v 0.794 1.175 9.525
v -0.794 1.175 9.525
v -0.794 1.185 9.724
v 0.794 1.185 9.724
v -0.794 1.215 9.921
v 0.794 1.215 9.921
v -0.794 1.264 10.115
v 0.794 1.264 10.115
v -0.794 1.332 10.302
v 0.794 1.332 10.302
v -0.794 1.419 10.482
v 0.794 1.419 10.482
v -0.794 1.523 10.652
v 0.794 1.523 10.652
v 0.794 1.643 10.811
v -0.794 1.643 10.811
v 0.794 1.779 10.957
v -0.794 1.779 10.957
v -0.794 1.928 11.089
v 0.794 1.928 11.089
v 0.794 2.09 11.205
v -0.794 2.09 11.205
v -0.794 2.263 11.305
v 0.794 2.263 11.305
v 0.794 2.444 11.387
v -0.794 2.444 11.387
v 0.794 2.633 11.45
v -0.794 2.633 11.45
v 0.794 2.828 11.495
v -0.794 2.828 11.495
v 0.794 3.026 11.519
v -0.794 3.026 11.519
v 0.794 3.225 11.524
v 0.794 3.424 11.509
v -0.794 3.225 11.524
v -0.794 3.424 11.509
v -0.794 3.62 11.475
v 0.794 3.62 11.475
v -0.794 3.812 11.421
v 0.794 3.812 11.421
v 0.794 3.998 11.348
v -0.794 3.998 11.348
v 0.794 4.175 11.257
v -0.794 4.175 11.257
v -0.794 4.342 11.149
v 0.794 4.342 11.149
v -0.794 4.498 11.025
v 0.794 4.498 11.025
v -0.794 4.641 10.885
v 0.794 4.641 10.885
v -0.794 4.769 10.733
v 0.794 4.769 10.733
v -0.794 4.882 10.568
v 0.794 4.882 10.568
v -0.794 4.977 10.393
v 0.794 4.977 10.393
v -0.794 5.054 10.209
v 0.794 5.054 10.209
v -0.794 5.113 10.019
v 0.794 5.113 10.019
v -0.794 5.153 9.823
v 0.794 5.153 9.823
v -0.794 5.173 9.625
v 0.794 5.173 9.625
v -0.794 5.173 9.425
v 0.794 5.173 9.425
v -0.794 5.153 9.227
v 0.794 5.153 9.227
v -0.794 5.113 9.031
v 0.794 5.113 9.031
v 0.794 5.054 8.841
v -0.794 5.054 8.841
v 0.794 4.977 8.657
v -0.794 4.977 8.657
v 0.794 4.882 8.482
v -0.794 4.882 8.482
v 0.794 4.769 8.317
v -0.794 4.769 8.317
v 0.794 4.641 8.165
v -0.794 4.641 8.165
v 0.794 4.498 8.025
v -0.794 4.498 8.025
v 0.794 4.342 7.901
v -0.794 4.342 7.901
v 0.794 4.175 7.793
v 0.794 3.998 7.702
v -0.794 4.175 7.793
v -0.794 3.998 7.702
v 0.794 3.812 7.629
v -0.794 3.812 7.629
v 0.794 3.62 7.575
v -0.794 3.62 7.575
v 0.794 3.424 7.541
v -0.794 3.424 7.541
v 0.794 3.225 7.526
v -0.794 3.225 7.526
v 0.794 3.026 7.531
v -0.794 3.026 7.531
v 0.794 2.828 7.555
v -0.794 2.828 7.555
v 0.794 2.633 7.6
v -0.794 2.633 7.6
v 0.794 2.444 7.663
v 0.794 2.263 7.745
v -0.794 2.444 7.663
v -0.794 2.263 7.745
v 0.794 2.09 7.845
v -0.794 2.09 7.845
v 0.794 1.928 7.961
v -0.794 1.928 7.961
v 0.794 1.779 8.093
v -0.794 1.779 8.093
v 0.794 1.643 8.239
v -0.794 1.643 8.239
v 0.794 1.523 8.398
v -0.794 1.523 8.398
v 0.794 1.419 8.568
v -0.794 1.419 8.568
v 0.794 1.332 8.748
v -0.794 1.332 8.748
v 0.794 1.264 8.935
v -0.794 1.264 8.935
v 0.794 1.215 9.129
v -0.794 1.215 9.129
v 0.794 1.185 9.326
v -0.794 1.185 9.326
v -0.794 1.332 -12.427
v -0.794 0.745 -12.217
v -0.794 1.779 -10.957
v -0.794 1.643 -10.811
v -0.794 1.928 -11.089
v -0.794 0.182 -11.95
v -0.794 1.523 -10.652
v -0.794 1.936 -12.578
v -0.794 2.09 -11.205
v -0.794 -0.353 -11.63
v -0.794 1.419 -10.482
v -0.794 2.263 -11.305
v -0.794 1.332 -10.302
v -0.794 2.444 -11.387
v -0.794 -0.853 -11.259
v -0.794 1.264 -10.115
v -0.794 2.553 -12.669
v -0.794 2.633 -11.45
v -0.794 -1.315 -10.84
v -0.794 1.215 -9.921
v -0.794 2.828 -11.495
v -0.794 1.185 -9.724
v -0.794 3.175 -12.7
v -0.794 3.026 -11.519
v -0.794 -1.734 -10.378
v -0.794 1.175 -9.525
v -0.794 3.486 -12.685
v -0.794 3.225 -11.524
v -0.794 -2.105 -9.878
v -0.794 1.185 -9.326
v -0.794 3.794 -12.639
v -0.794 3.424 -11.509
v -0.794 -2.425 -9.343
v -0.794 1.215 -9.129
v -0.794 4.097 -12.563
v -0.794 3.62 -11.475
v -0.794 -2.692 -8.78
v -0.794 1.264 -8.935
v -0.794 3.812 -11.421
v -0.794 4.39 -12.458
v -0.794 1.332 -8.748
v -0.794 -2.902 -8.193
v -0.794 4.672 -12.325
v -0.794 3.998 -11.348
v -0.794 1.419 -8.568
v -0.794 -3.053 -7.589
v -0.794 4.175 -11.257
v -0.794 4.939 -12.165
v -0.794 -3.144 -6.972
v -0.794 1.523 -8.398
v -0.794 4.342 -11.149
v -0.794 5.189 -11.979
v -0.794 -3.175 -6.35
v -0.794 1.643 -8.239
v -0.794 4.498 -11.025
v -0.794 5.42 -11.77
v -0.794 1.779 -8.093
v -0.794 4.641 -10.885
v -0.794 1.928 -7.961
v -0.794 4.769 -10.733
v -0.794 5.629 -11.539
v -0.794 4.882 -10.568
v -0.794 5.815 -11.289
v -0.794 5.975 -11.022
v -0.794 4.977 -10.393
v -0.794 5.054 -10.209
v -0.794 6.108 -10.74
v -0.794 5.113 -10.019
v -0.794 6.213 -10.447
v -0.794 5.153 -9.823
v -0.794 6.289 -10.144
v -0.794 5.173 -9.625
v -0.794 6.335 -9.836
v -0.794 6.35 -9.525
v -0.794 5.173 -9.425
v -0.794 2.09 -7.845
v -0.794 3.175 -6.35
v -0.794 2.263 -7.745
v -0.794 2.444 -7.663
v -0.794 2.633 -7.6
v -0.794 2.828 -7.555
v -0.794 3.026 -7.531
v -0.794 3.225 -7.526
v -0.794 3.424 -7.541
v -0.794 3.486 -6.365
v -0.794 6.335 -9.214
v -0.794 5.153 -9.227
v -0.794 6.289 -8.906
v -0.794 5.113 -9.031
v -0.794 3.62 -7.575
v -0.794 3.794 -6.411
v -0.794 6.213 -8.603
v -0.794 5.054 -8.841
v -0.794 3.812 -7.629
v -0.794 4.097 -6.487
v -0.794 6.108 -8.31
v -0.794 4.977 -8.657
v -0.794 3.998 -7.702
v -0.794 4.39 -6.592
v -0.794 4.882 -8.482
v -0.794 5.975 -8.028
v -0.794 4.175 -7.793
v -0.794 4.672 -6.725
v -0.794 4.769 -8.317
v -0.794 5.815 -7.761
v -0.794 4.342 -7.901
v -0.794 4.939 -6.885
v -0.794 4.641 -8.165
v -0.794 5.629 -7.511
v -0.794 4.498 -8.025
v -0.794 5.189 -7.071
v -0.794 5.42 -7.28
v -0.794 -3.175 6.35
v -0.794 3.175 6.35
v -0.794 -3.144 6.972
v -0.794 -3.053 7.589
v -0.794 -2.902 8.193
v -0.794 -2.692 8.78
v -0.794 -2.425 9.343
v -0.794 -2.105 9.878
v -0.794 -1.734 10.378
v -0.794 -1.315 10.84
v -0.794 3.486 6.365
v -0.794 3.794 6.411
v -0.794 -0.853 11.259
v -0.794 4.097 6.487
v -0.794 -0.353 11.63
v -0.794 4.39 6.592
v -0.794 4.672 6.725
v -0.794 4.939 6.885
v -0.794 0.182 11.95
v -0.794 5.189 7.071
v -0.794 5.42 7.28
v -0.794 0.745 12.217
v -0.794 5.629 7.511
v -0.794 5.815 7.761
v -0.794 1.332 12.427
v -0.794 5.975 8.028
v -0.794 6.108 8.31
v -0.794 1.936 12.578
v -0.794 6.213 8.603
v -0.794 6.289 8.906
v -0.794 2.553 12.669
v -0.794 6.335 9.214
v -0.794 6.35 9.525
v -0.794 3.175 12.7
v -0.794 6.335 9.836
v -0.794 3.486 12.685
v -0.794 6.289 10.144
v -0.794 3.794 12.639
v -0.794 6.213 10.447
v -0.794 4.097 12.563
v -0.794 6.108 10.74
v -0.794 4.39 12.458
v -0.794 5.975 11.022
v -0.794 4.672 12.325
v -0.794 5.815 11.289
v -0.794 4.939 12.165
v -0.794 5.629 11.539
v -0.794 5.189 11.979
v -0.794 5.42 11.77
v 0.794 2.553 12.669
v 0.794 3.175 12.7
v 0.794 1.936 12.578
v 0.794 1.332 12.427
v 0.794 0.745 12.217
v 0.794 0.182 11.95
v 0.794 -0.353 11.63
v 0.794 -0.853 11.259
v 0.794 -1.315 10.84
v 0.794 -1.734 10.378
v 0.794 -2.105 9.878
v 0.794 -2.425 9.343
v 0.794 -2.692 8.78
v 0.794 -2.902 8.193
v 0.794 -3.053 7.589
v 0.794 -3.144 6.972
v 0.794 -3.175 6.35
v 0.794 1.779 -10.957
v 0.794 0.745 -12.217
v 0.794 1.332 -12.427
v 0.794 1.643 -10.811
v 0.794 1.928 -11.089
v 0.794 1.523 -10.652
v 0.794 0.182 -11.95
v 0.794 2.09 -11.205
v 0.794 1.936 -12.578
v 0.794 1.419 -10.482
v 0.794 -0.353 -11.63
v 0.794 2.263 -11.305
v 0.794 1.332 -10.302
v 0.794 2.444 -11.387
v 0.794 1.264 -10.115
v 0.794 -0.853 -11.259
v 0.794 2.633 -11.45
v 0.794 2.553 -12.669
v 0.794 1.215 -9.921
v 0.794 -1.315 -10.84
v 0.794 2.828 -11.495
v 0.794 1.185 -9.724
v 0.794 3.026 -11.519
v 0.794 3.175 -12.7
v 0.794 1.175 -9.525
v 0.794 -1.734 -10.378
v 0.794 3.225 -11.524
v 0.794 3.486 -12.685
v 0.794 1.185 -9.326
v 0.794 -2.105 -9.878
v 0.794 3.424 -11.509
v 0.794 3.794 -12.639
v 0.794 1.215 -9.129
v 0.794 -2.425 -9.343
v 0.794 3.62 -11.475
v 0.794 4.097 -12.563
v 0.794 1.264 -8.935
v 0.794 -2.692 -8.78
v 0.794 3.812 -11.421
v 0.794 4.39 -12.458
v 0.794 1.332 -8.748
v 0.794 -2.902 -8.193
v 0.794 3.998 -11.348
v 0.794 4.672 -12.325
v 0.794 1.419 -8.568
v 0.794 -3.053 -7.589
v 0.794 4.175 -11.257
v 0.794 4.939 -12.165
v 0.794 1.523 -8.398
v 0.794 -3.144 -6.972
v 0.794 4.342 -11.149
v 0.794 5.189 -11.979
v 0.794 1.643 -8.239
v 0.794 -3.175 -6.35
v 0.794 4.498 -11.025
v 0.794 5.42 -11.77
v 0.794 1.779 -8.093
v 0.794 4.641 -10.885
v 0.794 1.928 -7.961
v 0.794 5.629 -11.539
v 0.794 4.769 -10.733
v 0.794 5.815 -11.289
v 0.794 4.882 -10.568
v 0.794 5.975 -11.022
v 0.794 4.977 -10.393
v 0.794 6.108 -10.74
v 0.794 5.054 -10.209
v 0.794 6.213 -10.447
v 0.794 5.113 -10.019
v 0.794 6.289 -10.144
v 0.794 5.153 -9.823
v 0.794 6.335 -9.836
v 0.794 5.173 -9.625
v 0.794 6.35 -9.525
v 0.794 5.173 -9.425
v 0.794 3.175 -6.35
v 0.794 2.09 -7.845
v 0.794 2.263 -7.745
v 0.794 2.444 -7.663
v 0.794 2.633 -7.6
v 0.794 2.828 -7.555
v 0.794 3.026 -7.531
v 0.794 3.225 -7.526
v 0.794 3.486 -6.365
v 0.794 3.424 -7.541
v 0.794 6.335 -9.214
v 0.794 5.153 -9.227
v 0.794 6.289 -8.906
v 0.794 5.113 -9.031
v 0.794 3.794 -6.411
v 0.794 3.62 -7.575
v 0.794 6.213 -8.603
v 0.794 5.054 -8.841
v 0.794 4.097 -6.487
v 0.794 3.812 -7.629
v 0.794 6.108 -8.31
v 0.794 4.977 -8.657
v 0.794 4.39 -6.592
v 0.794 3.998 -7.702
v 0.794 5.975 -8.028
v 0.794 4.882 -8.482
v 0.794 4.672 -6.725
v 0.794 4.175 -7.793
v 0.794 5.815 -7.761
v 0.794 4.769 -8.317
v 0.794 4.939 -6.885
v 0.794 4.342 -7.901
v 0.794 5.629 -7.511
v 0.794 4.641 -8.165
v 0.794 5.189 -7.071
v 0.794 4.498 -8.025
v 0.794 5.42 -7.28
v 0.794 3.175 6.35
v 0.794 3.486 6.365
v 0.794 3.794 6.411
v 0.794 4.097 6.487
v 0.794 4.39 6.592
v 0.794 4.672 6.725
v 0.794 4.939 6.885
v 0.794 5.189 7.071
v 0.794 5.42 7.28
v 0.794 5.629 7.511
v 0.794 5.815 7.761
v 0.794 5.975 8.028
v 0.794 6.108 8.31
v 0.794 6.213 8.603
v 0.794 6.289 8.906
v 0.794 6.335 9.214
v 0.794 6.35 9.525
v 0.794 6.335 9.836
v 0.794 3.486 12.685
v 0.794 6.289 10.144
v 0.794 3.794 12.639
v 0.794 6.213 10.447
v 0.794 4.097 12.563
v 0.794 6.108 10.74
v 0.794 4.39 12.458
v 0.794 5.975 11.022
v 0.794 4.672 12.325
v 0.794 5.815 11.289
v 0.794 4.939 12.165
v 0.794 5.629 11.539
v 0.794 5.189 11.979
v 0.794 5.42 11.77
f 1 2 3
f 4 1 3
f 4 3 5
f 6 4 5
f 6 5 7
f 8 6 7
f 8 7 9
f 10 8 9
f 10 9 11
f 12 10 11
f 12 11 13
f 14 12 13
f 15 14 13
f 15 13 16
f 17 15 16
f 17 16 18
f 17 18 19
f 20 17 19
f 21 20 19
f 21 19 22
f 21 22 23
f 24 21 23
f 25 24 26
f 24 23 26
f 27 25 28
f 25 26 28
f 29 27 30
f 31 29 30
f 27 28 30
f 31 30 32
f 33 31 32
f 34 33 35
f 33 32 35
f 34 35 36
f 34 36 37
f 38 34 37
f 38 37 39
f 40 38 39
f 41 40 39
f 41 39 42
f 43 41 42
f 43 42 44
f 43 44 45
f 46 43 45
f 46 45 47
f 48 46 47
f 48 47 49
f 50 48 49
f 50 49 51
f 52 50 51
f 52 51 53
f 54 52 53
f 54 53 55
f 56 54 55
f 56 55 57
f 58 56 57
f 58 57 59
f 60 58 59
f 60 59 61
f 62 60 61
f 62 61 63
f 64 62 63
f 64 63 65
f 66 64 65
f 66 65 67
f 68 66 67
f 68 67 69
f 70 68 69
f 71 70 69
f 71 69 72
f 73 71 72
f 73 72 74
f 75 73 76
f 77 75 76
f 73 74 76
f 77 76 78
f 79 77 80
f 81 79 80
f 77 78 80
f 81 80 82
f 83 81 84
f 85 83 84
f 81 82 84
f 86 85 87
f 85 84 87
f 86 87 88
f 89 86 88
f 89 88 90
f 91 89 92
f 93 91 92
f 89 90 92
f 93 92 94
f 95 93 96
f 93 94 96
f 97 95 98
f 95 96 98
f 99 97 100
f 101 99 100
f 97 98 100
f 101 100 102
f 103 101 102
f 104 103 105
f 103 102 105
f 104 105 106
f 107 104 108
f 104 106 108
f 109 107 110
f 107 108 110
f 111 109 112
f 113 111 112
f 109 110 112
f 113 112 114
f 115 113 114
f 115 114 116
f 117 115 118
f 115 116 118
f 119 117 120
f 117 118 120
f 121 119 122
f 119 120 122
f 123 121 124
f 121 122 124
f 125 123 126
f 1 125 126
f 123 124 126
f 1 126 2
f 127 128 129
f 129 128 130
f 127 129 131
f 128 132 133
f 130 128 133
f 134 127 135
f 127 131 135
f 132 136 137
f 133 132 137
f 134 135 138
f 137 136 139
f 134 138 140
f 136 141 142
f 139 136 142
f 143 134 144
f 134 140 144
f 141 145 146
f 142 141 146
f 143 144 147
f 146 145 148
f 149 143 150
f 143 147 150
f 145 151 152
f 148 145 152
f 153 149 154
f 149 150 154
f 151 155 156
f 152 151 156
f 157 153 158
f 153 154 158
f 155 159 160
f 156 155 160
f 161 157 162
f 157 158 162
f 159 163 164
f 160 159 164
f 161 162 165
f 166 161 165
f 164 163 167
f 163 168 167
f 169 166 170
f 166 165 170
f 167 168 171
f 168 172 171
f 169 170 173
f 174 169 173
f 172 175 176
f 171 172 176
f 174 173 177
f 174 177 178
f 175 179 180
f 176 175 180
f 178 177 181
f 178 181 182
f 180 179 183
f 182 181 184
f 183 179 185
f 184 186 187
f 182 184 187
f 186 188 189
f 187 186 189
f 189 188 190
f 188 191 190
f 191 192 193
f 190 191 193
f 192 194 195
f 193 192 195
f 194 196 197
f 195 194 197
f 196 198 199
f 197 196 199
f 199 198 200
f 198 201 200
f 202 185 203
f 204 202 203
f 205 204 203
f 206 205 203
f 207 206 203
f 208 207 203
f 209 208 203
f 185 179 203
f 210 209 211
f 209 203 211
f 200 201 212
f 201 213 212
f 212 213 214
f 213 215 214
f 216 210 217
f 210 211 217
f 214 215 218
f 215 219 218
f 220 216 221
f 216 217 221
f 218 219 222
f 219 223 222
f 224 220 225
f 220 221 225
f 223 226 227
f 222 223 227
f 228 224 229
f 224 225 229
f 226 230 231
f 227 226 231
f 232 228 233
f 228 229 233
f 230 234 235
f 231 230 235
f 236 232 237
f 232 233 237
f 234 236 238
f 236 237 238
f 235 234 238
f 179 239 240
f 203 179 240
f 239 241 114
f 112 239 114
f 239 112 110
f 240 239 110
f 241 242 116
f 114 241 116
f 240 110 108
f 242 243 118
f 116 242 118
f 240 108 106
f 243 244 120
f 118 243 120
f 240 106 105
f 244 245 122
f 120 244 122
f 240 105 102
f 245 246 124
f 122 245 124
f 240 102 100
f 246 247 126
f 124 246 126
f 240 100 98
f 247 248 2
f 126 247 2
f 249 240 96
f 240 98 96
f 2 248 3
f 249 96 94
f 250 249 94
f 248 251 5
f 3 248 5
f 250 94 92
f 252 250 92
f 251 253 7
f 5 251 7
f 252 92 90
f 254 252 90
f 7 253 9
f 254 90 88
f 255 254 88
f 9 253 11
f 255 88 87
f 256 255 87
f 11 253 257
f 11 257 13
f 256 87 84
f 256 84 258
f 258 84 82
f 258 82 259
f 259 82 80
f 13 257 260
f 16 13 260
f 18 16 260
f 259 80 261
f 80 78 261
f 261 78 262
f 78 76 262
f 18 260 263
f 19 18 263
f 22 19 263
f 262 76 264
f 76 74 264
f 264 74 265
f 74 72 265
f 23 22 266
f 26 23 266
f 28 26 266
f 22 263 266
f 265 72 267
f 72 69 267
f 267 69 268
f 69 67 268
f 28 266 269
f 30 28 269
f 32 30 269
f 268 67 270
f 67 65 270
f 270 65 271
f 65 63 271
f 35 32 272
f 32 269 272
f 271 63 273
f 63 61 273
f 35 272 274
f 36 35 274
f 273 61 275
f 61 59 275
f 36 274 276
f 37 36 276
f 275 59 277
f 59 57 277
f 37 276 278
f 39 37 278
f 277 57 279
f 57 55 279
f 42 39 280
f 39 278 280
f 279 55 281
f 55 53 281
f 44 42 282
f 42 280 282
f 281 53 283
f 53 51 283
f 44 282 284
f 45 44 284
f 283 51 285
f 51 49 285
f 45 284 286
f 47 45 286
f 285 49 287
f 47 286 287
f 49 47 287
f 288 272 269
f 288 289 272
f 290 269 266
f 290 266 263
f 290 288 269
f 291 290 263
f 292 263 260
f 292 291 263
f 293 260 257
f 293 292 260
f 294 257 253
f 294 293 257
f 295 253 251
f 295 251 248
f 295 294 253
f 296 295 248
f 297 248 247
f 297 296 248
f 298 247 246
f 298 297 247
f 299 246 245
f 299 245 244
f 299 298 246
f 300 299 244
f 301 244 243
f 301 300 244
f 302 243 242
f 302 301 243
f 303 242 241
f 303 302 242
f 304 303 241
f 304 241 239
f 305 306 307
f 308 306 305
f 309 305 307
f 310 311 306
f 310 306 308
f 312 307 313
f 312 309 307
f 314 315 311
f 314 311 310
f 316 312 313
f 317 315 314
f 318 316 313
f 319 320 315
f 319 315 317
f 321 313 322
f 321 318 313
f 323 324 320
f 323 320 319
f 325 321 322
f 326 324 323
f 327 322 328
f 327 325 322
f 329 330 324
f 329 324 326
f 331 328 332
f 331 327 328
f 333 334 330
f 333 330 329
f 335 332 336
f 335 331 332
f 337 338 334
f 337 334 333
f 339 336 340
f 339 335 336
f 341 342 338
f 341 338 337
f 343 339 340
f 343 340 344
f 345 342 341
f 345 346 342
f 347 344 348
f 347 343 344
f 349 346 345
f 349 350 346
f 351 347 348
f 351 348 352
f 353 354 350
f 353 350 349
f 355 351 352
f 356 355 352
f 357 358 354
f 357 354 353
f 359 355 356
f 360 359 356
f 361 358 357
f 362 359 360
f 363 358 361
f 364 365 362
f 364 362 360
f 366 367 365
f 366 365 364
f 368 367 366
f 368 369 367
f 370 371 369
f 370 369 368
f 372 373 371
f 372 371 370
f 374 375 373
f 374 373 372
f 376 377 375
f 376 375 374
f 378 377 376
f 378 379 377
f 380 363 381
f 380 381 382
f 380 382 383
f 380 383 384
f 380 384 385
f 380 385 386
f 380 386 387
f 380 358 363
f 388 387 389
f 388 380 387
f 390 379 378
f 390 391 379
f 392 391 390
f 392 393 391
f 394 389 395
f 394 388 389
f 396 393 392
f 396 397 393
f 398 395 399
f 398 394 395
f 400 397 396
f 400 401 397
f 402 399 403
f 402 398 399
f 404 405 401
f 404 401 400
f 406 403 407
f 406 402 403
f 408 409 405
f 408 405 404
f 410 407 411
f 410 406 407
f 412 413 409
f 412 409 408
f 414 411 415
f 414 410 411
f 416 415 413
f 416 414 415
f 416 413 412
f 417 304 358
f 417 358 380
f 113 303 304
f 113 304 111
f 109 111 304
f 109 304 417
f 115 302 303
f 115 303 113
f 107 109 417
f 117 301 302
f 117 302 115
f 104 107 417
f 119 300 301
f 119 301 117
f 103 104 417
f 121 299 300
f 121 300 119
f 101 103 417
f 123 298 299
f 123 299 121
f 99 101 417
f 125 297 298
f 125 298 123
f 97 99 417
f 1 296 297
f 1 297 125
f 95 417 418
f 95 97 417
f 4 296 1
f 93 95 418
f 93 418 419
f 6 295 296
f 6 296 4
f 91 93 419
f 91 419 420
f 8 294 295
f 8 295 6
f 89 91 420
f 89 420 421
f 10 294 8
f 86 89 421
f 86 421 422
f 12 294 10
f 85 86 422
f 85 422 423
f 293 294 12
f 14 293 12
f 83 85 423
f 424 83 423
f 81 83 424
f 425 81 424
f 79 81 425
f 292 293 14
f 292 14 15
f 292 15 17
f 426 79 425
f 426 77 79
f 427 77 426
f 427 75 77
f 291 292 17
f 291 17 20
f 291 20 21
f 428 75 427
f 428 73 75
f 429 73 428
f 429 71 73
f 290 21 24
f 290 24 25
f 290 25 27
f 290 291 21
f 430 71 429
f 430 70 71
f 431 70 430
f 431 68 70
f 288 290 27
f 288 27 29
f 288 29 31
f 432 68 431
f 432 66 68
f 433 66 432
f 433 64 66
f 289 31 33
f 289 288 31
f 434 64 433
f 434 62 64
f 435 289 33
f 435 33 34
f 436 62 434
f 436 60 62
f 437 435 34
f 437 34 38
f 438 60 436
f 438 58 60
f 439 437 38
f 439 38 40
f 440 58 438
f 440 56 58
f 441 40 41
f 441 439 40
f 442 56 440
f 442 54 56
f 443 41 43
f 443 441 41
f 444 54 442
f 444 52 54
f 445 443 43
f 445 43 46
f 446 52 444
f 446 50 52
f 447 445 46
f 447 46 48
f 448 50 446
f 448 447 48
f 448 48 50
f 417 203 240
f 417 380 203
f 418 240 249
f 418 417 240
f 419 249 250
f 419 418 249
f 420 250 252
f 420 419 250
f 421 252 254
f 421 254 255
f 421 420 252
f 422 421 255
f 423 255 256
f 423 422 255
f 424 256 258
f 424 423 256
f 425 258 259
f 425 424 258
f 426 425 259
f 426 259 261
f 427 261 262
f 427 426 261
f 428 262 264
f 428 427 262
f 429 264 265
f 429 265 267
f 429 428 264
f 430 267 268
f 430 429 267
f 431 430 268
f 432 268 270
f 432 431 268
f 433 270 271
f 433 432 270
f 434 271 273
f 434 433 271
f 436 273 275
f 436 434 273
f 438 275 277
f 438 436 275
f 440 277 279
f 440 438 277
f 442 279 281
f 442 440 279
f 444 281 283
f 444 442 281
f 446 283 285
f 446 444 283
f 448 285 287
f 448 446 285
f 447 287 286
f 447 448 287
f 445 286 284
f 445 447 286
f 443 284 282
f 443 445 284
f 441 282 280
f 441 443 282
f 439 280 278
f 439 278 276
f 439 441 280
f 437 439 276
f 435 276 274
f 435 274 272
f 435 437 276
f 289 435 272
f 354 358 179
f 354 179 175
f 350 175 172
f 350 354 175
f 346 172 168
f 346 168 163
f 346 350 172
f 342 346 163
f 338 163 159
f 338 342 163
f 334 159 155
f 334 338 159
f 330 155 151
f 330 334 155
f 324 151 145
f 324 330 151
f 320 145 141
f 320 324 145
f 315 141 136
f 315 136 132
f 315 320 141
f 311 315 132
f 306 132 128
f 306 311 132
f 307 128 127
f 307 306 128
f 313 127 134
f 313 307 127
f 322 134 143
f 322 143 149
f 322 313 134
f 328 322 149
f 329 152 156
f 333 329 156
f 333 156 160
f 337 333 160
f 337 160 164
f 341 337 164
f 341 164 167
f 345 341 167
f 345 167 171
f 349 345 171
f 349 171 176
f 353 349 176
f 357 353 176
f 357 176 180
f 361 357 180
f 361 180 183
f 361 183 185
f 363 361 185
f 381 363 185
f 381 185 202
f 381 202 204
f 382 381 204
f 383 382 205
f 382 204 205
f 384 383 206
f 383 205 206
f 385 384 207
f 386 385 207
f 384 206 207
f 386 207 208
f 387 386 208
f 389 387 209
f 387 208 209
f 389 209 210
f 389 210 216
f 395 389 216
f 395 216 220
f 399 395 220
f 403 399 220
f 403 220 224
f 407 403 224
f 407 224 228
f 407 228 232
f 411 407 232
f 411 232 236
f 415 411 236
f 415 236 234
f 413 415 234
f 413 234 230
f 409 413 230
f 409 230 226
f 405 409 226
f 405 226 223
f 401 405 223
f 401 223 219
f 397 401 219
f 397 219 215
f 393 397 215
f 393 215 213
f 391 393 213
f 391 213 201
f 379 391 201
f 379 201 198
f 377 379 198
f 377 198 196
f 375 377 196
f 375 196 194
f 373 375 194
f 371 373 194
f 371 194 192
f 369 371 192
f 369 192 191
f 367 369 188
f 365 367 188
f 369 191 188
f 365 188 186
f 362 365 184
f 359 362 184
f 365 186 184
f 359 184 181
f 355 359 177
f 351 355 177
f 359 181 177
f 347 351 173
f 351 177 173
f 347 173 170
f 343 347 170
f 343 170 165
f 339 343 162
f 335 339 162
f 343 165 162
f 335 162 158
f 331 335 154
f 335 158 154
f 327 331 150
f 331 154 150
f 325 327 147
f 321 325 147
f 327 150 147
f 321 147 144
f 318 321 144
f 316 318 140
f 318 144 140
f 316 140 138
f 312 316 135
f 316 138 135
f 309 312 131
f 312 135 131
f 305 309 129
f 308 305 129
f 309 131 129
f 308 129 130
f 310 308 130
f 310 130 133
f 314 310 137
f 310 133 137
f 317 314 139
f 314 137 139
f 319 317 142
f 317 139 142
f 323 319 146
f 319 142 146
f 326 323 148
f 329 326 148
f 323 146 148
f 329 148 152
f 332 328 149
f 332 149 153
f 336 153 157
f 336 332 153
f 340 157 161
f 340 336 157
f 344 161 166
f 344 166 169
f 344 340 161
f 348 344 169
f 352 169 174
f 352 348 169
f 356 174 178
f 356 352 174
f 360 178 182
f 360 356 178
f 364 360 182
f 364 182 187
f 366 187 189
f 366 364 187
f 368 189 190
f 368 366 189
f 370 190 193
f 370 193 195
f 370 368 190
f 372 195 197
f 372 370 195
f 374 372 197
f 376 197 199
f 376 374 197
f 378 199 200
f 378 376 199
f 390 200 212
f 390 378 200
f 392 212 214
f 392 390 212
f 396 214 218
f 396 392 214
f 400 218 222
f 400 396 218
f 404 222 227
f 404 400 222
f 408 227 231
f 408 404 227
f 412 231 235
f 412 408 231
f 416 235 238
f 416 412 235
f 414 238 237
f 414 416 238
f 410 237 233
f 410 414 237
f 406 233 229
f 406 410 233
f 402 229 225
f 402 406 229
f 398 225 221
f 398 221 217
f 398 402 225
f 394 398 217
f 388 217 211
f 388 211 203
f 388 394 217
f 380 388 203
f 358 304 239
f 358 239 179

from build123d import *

# Parameters (mm, degrees)
F1_DEPTH = 0.79375
F3_D     = 4


with BuildPart() as f1:
    # F0 (on Right) → F1 (new body, symmetric)
    with BuildSketch(Plane.YZ):
        with BuildLine():
            ThreePointArc((3.175, 12.7), (-1.315128, 10.840128), (-3.175, 6.35))
            Line((-3.175, 6.35), (-3.175, -6.35))
            ThreePointArc((-3.175, -6.35), (-1.315128, -10.840128), (3.175, -12.7))
            ThreePointArc((3.175, -12.7), (6.35, -9.525), (3.175, -6.35))
            Line((3.175, -6.35), (3.175, 6.35))
            ThreePointArc((3.175, 6.35), (6.35, 9.525), (3.175, 12.7))
        make_face()
    extrude(amount=F1_DEPTH, both=True)

    # F3 (through all)
    with Locations(Plane.YZ.offset(0.79375)):
        with Locations((3.175, 9.525), (3.175, -9.525)):
            Hole(F3_D / 2)


solid = f1.part
